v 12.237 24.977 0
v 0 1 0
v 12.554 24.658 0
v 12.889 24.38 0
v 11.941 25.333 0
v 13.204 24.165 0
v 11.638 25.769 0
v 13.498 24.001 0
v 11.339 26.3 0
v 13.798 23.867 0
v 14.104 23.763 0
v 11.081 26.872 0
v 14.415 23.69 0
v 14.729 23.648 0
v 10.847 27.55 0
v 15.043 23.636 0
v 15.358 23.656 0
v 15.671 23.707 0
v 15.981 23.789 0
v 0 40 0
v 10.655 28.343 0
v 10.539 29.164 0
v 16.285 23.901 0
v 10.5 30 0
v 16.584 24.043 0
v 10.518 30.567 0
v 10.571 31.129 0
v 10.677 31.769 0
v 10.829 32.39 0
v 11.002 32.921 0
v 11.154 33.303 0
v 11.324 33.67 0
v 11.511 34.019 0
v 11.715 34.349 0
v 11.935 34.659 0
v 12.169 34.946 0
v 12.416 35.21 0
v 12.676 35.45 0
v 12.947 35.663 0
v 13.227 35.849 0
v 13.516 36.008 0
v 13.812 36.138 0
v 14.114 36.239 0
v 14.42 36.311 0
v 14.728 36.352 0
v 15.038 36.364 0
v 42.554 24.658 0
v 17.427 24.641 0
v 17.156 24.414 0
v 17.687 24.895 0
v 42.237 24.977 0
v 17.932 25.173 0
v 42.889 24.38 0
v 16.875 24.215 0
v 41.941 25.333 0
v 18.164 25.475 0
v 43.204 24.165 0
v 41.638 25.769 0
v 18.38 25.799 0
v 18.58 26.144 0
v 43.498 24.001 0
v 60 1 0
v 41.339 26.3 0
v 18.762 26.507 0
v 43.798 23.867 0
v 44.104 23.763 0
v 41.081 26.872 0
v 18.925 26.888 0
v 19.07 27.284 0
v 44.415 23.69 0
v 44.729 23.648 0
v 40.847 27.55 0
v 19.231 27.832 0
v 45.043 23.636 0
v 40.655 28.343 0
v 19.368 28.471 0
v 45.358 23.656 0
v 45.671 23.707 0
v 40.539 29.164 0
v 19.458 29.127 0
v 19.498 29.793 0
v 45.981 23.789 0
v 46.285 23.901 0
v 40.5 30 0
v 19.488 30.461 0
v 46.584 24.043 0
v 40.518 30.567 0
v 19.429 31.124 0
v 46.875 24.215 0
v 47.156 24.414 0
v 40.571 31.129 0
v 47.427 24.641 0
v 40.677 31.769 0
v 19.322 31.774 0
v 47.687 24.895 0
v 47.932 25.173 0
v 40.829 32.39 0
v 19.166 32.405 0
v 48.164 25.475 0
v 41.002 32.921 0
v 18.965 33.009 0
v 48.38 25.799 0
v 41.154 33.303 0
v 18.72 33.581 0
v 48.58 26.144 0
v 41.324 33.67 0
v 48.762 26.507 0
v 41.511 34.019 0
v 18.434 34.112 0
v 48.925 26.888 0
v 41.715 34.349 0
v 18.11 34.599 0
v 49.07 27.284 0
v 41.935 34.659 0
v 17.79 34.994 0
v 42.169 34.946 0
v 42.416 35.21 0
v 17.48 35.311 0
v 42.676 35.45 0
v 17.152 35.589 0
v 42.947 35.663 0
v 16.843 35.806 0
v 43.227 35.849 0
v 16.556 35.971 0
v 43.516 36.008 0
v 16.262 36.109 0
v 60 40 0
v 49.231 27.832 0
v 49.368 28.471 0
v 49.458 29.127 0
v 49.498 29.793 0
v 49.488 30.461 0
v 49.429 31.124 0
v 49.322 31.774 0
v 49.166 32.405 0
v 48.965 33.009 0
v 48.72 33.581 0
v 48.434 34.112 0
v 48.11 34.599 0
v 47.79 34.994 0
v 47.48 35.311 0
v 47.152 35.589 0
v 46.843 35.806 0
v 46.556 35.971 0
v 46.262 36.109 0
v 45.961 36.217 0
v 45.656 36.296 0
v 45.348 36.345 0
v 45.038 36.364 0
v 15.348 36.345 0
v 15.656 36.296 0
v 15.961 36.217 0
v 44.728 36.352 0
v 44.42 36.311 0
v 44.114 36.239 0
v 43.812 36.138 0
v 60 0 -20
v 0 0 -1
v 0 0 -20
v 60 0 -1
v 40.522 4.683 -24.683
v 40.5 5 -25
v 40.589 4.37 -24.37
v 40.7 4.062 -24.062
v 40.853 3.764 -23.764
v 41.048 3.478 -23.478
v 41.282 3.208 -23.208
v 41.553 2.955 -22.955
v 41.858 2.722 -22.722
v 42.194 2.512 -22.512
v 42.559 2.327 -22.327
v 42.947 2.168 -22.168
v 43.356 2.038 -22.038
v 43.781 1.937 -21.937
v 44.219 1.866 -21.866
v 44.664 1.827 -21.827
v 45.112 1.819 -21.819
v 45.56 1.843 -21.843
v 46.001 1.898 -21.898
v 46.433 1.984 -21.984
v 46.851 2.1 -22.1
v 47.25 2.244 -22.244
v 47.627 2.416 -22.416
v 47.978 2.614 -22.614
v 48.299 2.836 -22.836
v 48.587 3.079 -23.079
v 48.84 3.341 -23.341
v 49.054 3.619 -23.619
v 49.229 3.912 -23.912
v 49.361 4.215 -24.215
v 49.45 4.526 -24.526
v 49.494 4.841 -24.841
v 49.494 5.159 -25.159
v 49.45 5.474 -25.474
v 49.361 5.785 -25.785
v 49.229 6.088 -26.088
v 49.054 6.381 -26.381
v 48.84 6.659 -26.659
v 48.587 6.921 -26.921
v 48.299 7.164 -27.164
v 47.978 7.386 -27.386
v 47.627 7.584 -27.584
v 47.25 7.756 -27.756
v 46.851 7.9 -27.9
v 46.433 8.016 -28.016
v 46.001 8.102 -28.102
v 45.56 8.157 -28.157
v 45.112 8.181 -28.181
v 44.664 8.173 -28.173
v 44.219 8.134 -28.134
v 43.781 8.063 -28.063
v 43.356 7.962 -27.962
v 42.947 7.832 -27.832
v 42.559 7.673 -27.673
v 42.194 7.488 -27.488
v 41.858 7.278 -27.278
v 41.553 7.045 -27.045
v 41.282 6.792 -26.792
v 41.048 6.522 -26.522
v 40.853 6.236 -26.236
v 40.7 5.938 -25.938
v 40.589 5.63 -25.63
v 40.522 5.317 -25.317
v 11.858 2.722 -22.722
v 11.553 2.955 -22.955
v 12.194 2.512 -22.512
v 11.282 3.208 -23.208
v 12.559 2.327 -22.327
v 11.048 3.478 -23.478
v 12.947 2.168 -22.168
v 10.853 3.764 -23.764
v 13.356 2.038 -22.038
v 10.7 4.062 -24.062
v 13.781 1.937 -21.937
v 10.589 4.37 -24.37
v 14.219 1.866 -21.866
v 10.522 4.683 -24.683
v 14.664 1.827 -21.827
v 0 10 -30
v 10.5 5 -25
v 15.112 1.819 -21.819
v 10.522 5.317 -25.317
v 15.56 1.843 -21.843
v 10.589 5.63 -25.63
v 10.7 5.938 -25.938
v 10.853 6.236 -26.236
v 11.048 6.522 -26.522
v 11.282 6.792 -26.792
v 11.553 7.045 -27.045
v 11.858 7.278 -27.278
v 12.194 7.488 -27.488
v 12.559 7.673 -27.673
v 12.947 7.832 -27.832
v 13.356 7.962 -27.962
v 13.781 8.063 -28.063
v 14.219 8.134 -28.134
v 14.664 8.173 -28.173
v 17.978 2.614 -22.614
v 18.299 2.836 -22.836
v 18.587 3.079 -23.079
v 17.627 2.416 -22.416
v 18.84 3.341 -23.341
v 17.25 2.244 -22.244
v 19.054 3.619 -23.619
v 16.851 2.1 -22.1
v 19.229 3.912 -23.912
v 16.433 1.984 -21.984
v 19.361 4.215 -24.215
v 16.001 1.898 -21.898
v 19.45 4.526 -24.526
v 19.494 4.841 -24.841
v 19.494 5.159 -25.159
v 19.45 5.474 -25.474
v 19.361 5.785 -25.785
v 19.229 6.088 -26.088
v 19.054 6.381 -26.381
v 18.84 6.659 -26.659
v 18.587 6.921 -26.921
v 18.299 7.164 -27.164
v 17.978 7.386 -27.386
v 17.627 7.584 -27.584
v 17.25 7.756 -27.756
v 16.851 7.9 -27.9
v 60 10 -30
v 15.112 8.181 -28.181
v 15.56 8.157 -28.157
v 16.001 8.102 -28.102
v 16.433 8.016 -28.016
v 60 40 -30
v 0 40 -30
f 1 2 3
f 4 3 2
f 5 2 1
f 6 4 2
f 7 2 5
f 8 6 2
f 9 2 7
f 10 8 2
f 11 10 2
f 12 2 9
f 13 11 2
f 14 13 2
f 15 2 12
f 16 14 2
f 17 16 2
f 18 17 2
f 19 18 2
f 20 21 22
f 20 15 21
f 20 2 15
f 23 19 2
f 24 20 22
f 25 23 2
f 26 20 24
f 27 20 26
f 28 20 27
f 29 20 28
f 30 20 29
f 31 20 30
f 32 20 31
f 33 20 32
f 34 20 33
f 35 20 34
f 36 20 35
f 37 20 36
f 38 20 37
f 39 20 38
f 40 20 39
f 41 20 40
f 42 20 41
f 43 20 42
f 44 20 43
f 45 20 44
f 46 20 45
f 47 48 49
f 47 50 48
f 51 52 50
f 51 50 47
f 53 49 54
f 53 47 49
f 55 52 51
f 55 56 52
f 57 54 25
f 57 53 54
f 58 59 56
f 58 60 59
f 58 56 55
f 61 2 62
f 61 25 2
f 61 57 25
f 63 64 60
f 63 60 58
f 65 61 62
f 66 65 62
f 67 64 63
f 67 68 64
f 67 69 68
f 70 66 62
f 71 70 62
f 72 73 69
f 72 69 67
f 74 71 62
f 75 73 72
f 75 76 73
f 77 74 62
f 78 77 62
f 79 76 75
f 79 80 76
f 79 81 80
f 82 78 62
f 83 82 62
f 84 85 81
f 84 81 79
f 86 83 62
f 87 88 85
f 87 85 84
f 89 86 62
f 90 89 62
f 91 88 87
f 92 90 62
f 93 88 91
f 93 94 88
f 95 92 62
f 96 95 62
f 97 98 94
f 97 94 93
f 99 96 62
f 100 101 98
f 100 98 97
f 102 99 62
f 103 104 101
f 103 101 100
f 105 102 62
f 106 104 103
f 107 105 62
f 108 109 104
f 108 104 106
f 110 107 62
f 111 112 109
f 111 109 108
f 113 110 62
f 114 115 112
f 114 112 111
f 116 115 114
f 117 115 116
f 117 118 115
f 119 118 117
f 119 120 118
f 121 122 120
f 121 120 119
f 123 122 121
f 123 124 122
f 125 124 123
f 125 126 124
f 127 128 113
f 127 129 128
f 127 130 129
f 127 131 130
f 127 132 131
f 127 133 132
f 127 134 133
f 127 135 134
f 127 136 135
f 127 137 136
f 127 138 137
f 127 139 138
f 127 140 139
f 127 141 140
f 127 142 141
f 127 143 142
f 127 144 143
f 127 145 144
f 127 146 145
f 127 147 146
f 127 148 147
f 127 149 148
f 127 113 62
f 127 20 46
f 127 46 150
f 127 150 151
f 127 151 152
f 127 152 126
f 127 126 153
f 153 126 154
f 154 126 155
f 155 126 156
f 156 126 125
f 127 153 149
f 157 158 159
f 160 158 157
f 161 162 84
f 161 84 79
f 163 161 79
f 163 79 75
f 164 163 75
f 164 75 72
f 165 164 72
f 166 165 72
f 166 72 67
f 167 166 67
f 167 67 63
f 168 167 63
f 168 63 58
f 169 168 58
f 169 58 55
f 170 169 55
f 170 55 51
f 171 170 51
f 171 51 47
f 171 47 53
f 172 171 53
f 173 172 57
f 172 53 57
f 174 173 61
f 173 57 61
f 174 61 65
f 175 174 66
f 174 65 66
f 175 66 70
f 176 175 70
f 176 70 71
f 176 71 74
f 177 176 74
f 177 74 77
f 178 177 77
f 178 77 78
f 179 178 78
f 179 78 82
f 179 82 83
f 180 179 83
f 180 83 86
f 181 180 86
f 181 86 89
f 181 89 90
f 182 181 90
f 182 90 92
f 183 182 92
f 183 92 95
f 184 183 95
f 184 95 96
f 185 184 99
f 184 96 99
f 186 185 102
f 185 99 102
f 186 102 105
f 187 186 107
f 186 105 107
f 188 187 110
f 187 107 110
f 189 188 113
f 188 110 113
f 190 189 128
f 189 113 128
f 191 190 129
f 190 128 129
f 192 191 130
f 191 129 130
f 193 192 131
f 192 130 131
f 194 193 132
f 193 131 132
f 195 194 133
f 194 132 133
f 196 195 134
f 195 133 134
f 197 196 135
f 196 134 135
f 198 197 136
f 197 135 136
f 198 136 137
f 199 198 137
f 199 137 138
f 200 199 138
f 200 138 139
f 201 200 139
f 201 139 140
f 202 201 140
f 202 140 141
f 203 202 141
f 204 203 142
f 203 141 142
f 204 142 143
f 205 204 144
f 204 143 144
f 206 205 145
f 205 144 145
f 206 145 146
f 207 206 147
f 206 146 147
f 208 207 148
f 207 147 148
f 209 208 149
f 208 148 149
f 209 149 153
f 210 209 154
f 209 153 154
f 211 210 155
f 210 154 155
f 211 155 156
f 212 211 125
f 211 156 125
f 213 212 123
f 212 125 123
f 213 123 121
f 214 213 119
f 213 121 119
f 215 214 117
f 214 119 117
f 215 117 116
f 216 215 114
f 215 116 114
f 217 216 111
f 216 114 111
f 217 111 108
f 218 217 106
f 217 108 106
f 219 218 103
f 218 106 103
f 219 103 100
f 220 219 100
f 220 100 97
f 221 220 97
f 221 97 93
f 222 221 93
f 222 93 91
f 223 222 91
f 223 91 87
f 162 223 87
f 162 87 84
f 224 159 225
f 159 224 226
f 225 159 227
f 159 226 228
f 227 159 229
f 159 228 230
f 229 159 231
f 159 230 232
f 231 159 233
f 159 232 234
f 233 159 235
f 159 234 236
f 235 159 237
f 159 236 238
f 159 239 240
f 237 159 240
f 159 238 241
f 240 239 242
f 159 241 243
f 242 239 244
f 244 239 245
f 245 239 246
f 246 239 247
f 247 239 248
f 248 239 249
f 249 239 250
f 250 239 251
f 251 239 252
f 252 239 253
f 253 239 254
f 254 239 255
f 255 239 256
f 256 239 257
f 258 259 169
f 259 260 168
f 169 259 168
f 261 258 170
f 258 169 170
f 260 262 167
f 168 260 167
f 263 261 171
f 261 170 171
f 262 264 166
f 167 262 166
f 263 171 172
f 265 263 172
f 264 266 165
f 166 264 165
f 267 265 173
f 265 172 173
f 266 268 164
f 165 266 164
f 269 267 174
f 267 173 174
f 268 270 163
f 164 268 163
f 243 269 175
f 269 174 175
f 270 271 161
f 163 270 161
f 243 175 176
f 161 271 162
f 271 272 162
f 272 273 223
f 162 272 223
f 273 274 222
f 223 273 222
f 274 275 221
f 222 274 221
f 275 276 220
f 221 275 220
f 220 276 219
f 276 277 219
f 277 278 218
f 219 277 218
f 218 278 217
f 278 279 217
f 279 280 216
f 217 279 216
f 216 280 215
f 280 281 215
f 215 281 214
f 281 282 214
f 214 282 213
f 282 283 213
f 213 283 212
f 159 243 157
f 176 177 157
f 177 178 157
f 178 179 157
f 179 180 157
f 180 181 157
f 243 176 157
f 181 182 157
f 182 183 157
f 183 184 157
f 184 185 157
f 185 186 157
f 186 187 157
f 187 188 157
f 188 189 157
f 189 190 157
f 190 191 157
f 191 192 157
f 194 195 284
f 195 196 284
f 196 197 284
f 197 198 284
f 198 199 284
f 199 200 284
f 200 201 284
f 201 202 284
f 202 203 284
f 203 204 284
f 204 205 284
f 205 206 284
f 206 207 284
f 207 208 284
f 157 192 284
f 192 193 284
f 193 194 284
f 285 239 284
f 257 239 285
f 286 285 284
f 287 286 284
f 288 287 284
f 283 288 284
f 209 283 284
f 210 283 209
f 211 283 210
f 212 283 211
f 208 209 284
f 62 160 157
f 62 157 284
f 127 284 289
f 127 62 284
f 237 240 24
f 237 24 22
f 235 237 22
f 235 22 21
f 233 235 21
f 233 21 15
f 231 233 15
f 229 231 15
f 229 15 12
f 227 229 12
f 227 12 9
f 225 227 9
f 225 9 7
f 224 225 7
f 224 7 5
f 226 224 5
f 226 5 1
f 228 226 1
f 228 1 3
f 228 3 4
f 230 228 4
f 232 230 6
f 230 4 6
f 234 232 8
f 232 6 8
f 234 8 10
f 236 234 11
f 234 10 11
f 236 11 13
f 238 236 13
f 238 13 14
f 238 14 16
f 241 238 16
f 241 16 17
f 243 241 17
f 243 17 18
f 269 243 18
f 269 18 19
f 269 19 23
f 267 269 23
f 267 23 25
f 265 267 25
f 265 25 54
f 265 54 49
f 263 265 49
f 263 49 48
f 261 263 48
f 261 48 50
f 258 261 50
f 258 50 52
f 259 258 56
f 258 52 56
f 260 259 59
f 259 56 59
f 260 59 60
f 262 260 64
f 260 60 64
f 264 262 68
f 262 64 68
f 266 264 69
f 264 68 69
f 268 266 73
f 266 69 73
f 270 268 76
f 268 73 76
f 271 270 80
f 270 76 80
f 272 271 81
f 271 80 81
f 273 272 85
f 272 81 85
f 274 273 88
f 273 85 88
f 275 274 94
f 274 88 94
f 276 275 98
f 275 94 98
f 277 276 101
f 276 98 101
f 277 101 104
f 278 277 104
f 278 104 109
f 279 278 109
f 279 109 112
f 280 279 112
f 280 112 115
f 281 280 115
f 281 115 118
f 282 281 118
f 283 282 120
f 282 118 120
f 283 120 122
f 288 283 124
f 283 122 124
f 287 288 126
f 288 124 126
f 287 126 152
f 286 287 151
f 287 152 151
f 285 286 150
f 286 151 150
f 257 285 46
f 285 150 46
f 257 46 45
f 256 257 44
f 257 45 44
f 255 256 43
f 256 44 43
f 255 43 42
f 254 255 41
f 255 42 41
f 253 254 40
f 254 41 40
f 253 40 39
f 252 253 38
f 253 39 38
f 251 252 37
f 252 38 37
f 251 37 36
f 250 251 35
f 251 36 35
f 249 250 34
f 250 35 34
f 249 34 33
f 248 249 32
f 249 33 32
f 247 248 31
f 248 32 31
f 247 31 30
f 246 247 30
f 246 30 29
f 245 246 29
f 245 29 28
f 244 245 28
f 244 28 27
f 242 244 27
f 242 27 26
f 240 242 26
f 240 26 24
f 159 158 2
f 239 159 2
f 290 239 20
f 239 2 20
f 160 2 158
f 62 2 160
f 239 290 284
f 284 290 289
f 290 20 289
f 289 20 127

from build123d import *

# Parameters (mm, degrees)
F0_W     = 60
F0_H     = 40
F1_DEPTH = 30
F2_SIZE  = 10
F4_D     = 9
F5_SIZE  = 1


with BuildPart() as f1:
    # F0 (on Top) → F1 (new body)
    with BuildSketch(Plane.XY):
        with Locations((30, 20)):
            Rectangle(F0_W, F0_H)
    extrude(amount=-F1_DEPTH)

    # F2
    f2_edges = [f1.edges().sort_by_distance(p)[0] for p in [
        (30, 0, -30),
    ]]
    chamfer(f2_edges, length=F2_SIZE)

    # F4 (through all)
    with Locations(Plane(origin=(0, -10, -10), x_dir=(1, 0, 0), z_dir=(0, -0.7071067812, -0.7071067812))):
        with Locations((15, -21.2132034356), (45, -21.2132034356)):
            Hole(F4_D / 2)

    # F5
    f5_edges = [f1.edges().sort_by_distance(p)[0] for p in [
        (30, 0, 0),
    ]]
    chamfer(f5_edges, length=F5_SIZE)


solid = f1.part
